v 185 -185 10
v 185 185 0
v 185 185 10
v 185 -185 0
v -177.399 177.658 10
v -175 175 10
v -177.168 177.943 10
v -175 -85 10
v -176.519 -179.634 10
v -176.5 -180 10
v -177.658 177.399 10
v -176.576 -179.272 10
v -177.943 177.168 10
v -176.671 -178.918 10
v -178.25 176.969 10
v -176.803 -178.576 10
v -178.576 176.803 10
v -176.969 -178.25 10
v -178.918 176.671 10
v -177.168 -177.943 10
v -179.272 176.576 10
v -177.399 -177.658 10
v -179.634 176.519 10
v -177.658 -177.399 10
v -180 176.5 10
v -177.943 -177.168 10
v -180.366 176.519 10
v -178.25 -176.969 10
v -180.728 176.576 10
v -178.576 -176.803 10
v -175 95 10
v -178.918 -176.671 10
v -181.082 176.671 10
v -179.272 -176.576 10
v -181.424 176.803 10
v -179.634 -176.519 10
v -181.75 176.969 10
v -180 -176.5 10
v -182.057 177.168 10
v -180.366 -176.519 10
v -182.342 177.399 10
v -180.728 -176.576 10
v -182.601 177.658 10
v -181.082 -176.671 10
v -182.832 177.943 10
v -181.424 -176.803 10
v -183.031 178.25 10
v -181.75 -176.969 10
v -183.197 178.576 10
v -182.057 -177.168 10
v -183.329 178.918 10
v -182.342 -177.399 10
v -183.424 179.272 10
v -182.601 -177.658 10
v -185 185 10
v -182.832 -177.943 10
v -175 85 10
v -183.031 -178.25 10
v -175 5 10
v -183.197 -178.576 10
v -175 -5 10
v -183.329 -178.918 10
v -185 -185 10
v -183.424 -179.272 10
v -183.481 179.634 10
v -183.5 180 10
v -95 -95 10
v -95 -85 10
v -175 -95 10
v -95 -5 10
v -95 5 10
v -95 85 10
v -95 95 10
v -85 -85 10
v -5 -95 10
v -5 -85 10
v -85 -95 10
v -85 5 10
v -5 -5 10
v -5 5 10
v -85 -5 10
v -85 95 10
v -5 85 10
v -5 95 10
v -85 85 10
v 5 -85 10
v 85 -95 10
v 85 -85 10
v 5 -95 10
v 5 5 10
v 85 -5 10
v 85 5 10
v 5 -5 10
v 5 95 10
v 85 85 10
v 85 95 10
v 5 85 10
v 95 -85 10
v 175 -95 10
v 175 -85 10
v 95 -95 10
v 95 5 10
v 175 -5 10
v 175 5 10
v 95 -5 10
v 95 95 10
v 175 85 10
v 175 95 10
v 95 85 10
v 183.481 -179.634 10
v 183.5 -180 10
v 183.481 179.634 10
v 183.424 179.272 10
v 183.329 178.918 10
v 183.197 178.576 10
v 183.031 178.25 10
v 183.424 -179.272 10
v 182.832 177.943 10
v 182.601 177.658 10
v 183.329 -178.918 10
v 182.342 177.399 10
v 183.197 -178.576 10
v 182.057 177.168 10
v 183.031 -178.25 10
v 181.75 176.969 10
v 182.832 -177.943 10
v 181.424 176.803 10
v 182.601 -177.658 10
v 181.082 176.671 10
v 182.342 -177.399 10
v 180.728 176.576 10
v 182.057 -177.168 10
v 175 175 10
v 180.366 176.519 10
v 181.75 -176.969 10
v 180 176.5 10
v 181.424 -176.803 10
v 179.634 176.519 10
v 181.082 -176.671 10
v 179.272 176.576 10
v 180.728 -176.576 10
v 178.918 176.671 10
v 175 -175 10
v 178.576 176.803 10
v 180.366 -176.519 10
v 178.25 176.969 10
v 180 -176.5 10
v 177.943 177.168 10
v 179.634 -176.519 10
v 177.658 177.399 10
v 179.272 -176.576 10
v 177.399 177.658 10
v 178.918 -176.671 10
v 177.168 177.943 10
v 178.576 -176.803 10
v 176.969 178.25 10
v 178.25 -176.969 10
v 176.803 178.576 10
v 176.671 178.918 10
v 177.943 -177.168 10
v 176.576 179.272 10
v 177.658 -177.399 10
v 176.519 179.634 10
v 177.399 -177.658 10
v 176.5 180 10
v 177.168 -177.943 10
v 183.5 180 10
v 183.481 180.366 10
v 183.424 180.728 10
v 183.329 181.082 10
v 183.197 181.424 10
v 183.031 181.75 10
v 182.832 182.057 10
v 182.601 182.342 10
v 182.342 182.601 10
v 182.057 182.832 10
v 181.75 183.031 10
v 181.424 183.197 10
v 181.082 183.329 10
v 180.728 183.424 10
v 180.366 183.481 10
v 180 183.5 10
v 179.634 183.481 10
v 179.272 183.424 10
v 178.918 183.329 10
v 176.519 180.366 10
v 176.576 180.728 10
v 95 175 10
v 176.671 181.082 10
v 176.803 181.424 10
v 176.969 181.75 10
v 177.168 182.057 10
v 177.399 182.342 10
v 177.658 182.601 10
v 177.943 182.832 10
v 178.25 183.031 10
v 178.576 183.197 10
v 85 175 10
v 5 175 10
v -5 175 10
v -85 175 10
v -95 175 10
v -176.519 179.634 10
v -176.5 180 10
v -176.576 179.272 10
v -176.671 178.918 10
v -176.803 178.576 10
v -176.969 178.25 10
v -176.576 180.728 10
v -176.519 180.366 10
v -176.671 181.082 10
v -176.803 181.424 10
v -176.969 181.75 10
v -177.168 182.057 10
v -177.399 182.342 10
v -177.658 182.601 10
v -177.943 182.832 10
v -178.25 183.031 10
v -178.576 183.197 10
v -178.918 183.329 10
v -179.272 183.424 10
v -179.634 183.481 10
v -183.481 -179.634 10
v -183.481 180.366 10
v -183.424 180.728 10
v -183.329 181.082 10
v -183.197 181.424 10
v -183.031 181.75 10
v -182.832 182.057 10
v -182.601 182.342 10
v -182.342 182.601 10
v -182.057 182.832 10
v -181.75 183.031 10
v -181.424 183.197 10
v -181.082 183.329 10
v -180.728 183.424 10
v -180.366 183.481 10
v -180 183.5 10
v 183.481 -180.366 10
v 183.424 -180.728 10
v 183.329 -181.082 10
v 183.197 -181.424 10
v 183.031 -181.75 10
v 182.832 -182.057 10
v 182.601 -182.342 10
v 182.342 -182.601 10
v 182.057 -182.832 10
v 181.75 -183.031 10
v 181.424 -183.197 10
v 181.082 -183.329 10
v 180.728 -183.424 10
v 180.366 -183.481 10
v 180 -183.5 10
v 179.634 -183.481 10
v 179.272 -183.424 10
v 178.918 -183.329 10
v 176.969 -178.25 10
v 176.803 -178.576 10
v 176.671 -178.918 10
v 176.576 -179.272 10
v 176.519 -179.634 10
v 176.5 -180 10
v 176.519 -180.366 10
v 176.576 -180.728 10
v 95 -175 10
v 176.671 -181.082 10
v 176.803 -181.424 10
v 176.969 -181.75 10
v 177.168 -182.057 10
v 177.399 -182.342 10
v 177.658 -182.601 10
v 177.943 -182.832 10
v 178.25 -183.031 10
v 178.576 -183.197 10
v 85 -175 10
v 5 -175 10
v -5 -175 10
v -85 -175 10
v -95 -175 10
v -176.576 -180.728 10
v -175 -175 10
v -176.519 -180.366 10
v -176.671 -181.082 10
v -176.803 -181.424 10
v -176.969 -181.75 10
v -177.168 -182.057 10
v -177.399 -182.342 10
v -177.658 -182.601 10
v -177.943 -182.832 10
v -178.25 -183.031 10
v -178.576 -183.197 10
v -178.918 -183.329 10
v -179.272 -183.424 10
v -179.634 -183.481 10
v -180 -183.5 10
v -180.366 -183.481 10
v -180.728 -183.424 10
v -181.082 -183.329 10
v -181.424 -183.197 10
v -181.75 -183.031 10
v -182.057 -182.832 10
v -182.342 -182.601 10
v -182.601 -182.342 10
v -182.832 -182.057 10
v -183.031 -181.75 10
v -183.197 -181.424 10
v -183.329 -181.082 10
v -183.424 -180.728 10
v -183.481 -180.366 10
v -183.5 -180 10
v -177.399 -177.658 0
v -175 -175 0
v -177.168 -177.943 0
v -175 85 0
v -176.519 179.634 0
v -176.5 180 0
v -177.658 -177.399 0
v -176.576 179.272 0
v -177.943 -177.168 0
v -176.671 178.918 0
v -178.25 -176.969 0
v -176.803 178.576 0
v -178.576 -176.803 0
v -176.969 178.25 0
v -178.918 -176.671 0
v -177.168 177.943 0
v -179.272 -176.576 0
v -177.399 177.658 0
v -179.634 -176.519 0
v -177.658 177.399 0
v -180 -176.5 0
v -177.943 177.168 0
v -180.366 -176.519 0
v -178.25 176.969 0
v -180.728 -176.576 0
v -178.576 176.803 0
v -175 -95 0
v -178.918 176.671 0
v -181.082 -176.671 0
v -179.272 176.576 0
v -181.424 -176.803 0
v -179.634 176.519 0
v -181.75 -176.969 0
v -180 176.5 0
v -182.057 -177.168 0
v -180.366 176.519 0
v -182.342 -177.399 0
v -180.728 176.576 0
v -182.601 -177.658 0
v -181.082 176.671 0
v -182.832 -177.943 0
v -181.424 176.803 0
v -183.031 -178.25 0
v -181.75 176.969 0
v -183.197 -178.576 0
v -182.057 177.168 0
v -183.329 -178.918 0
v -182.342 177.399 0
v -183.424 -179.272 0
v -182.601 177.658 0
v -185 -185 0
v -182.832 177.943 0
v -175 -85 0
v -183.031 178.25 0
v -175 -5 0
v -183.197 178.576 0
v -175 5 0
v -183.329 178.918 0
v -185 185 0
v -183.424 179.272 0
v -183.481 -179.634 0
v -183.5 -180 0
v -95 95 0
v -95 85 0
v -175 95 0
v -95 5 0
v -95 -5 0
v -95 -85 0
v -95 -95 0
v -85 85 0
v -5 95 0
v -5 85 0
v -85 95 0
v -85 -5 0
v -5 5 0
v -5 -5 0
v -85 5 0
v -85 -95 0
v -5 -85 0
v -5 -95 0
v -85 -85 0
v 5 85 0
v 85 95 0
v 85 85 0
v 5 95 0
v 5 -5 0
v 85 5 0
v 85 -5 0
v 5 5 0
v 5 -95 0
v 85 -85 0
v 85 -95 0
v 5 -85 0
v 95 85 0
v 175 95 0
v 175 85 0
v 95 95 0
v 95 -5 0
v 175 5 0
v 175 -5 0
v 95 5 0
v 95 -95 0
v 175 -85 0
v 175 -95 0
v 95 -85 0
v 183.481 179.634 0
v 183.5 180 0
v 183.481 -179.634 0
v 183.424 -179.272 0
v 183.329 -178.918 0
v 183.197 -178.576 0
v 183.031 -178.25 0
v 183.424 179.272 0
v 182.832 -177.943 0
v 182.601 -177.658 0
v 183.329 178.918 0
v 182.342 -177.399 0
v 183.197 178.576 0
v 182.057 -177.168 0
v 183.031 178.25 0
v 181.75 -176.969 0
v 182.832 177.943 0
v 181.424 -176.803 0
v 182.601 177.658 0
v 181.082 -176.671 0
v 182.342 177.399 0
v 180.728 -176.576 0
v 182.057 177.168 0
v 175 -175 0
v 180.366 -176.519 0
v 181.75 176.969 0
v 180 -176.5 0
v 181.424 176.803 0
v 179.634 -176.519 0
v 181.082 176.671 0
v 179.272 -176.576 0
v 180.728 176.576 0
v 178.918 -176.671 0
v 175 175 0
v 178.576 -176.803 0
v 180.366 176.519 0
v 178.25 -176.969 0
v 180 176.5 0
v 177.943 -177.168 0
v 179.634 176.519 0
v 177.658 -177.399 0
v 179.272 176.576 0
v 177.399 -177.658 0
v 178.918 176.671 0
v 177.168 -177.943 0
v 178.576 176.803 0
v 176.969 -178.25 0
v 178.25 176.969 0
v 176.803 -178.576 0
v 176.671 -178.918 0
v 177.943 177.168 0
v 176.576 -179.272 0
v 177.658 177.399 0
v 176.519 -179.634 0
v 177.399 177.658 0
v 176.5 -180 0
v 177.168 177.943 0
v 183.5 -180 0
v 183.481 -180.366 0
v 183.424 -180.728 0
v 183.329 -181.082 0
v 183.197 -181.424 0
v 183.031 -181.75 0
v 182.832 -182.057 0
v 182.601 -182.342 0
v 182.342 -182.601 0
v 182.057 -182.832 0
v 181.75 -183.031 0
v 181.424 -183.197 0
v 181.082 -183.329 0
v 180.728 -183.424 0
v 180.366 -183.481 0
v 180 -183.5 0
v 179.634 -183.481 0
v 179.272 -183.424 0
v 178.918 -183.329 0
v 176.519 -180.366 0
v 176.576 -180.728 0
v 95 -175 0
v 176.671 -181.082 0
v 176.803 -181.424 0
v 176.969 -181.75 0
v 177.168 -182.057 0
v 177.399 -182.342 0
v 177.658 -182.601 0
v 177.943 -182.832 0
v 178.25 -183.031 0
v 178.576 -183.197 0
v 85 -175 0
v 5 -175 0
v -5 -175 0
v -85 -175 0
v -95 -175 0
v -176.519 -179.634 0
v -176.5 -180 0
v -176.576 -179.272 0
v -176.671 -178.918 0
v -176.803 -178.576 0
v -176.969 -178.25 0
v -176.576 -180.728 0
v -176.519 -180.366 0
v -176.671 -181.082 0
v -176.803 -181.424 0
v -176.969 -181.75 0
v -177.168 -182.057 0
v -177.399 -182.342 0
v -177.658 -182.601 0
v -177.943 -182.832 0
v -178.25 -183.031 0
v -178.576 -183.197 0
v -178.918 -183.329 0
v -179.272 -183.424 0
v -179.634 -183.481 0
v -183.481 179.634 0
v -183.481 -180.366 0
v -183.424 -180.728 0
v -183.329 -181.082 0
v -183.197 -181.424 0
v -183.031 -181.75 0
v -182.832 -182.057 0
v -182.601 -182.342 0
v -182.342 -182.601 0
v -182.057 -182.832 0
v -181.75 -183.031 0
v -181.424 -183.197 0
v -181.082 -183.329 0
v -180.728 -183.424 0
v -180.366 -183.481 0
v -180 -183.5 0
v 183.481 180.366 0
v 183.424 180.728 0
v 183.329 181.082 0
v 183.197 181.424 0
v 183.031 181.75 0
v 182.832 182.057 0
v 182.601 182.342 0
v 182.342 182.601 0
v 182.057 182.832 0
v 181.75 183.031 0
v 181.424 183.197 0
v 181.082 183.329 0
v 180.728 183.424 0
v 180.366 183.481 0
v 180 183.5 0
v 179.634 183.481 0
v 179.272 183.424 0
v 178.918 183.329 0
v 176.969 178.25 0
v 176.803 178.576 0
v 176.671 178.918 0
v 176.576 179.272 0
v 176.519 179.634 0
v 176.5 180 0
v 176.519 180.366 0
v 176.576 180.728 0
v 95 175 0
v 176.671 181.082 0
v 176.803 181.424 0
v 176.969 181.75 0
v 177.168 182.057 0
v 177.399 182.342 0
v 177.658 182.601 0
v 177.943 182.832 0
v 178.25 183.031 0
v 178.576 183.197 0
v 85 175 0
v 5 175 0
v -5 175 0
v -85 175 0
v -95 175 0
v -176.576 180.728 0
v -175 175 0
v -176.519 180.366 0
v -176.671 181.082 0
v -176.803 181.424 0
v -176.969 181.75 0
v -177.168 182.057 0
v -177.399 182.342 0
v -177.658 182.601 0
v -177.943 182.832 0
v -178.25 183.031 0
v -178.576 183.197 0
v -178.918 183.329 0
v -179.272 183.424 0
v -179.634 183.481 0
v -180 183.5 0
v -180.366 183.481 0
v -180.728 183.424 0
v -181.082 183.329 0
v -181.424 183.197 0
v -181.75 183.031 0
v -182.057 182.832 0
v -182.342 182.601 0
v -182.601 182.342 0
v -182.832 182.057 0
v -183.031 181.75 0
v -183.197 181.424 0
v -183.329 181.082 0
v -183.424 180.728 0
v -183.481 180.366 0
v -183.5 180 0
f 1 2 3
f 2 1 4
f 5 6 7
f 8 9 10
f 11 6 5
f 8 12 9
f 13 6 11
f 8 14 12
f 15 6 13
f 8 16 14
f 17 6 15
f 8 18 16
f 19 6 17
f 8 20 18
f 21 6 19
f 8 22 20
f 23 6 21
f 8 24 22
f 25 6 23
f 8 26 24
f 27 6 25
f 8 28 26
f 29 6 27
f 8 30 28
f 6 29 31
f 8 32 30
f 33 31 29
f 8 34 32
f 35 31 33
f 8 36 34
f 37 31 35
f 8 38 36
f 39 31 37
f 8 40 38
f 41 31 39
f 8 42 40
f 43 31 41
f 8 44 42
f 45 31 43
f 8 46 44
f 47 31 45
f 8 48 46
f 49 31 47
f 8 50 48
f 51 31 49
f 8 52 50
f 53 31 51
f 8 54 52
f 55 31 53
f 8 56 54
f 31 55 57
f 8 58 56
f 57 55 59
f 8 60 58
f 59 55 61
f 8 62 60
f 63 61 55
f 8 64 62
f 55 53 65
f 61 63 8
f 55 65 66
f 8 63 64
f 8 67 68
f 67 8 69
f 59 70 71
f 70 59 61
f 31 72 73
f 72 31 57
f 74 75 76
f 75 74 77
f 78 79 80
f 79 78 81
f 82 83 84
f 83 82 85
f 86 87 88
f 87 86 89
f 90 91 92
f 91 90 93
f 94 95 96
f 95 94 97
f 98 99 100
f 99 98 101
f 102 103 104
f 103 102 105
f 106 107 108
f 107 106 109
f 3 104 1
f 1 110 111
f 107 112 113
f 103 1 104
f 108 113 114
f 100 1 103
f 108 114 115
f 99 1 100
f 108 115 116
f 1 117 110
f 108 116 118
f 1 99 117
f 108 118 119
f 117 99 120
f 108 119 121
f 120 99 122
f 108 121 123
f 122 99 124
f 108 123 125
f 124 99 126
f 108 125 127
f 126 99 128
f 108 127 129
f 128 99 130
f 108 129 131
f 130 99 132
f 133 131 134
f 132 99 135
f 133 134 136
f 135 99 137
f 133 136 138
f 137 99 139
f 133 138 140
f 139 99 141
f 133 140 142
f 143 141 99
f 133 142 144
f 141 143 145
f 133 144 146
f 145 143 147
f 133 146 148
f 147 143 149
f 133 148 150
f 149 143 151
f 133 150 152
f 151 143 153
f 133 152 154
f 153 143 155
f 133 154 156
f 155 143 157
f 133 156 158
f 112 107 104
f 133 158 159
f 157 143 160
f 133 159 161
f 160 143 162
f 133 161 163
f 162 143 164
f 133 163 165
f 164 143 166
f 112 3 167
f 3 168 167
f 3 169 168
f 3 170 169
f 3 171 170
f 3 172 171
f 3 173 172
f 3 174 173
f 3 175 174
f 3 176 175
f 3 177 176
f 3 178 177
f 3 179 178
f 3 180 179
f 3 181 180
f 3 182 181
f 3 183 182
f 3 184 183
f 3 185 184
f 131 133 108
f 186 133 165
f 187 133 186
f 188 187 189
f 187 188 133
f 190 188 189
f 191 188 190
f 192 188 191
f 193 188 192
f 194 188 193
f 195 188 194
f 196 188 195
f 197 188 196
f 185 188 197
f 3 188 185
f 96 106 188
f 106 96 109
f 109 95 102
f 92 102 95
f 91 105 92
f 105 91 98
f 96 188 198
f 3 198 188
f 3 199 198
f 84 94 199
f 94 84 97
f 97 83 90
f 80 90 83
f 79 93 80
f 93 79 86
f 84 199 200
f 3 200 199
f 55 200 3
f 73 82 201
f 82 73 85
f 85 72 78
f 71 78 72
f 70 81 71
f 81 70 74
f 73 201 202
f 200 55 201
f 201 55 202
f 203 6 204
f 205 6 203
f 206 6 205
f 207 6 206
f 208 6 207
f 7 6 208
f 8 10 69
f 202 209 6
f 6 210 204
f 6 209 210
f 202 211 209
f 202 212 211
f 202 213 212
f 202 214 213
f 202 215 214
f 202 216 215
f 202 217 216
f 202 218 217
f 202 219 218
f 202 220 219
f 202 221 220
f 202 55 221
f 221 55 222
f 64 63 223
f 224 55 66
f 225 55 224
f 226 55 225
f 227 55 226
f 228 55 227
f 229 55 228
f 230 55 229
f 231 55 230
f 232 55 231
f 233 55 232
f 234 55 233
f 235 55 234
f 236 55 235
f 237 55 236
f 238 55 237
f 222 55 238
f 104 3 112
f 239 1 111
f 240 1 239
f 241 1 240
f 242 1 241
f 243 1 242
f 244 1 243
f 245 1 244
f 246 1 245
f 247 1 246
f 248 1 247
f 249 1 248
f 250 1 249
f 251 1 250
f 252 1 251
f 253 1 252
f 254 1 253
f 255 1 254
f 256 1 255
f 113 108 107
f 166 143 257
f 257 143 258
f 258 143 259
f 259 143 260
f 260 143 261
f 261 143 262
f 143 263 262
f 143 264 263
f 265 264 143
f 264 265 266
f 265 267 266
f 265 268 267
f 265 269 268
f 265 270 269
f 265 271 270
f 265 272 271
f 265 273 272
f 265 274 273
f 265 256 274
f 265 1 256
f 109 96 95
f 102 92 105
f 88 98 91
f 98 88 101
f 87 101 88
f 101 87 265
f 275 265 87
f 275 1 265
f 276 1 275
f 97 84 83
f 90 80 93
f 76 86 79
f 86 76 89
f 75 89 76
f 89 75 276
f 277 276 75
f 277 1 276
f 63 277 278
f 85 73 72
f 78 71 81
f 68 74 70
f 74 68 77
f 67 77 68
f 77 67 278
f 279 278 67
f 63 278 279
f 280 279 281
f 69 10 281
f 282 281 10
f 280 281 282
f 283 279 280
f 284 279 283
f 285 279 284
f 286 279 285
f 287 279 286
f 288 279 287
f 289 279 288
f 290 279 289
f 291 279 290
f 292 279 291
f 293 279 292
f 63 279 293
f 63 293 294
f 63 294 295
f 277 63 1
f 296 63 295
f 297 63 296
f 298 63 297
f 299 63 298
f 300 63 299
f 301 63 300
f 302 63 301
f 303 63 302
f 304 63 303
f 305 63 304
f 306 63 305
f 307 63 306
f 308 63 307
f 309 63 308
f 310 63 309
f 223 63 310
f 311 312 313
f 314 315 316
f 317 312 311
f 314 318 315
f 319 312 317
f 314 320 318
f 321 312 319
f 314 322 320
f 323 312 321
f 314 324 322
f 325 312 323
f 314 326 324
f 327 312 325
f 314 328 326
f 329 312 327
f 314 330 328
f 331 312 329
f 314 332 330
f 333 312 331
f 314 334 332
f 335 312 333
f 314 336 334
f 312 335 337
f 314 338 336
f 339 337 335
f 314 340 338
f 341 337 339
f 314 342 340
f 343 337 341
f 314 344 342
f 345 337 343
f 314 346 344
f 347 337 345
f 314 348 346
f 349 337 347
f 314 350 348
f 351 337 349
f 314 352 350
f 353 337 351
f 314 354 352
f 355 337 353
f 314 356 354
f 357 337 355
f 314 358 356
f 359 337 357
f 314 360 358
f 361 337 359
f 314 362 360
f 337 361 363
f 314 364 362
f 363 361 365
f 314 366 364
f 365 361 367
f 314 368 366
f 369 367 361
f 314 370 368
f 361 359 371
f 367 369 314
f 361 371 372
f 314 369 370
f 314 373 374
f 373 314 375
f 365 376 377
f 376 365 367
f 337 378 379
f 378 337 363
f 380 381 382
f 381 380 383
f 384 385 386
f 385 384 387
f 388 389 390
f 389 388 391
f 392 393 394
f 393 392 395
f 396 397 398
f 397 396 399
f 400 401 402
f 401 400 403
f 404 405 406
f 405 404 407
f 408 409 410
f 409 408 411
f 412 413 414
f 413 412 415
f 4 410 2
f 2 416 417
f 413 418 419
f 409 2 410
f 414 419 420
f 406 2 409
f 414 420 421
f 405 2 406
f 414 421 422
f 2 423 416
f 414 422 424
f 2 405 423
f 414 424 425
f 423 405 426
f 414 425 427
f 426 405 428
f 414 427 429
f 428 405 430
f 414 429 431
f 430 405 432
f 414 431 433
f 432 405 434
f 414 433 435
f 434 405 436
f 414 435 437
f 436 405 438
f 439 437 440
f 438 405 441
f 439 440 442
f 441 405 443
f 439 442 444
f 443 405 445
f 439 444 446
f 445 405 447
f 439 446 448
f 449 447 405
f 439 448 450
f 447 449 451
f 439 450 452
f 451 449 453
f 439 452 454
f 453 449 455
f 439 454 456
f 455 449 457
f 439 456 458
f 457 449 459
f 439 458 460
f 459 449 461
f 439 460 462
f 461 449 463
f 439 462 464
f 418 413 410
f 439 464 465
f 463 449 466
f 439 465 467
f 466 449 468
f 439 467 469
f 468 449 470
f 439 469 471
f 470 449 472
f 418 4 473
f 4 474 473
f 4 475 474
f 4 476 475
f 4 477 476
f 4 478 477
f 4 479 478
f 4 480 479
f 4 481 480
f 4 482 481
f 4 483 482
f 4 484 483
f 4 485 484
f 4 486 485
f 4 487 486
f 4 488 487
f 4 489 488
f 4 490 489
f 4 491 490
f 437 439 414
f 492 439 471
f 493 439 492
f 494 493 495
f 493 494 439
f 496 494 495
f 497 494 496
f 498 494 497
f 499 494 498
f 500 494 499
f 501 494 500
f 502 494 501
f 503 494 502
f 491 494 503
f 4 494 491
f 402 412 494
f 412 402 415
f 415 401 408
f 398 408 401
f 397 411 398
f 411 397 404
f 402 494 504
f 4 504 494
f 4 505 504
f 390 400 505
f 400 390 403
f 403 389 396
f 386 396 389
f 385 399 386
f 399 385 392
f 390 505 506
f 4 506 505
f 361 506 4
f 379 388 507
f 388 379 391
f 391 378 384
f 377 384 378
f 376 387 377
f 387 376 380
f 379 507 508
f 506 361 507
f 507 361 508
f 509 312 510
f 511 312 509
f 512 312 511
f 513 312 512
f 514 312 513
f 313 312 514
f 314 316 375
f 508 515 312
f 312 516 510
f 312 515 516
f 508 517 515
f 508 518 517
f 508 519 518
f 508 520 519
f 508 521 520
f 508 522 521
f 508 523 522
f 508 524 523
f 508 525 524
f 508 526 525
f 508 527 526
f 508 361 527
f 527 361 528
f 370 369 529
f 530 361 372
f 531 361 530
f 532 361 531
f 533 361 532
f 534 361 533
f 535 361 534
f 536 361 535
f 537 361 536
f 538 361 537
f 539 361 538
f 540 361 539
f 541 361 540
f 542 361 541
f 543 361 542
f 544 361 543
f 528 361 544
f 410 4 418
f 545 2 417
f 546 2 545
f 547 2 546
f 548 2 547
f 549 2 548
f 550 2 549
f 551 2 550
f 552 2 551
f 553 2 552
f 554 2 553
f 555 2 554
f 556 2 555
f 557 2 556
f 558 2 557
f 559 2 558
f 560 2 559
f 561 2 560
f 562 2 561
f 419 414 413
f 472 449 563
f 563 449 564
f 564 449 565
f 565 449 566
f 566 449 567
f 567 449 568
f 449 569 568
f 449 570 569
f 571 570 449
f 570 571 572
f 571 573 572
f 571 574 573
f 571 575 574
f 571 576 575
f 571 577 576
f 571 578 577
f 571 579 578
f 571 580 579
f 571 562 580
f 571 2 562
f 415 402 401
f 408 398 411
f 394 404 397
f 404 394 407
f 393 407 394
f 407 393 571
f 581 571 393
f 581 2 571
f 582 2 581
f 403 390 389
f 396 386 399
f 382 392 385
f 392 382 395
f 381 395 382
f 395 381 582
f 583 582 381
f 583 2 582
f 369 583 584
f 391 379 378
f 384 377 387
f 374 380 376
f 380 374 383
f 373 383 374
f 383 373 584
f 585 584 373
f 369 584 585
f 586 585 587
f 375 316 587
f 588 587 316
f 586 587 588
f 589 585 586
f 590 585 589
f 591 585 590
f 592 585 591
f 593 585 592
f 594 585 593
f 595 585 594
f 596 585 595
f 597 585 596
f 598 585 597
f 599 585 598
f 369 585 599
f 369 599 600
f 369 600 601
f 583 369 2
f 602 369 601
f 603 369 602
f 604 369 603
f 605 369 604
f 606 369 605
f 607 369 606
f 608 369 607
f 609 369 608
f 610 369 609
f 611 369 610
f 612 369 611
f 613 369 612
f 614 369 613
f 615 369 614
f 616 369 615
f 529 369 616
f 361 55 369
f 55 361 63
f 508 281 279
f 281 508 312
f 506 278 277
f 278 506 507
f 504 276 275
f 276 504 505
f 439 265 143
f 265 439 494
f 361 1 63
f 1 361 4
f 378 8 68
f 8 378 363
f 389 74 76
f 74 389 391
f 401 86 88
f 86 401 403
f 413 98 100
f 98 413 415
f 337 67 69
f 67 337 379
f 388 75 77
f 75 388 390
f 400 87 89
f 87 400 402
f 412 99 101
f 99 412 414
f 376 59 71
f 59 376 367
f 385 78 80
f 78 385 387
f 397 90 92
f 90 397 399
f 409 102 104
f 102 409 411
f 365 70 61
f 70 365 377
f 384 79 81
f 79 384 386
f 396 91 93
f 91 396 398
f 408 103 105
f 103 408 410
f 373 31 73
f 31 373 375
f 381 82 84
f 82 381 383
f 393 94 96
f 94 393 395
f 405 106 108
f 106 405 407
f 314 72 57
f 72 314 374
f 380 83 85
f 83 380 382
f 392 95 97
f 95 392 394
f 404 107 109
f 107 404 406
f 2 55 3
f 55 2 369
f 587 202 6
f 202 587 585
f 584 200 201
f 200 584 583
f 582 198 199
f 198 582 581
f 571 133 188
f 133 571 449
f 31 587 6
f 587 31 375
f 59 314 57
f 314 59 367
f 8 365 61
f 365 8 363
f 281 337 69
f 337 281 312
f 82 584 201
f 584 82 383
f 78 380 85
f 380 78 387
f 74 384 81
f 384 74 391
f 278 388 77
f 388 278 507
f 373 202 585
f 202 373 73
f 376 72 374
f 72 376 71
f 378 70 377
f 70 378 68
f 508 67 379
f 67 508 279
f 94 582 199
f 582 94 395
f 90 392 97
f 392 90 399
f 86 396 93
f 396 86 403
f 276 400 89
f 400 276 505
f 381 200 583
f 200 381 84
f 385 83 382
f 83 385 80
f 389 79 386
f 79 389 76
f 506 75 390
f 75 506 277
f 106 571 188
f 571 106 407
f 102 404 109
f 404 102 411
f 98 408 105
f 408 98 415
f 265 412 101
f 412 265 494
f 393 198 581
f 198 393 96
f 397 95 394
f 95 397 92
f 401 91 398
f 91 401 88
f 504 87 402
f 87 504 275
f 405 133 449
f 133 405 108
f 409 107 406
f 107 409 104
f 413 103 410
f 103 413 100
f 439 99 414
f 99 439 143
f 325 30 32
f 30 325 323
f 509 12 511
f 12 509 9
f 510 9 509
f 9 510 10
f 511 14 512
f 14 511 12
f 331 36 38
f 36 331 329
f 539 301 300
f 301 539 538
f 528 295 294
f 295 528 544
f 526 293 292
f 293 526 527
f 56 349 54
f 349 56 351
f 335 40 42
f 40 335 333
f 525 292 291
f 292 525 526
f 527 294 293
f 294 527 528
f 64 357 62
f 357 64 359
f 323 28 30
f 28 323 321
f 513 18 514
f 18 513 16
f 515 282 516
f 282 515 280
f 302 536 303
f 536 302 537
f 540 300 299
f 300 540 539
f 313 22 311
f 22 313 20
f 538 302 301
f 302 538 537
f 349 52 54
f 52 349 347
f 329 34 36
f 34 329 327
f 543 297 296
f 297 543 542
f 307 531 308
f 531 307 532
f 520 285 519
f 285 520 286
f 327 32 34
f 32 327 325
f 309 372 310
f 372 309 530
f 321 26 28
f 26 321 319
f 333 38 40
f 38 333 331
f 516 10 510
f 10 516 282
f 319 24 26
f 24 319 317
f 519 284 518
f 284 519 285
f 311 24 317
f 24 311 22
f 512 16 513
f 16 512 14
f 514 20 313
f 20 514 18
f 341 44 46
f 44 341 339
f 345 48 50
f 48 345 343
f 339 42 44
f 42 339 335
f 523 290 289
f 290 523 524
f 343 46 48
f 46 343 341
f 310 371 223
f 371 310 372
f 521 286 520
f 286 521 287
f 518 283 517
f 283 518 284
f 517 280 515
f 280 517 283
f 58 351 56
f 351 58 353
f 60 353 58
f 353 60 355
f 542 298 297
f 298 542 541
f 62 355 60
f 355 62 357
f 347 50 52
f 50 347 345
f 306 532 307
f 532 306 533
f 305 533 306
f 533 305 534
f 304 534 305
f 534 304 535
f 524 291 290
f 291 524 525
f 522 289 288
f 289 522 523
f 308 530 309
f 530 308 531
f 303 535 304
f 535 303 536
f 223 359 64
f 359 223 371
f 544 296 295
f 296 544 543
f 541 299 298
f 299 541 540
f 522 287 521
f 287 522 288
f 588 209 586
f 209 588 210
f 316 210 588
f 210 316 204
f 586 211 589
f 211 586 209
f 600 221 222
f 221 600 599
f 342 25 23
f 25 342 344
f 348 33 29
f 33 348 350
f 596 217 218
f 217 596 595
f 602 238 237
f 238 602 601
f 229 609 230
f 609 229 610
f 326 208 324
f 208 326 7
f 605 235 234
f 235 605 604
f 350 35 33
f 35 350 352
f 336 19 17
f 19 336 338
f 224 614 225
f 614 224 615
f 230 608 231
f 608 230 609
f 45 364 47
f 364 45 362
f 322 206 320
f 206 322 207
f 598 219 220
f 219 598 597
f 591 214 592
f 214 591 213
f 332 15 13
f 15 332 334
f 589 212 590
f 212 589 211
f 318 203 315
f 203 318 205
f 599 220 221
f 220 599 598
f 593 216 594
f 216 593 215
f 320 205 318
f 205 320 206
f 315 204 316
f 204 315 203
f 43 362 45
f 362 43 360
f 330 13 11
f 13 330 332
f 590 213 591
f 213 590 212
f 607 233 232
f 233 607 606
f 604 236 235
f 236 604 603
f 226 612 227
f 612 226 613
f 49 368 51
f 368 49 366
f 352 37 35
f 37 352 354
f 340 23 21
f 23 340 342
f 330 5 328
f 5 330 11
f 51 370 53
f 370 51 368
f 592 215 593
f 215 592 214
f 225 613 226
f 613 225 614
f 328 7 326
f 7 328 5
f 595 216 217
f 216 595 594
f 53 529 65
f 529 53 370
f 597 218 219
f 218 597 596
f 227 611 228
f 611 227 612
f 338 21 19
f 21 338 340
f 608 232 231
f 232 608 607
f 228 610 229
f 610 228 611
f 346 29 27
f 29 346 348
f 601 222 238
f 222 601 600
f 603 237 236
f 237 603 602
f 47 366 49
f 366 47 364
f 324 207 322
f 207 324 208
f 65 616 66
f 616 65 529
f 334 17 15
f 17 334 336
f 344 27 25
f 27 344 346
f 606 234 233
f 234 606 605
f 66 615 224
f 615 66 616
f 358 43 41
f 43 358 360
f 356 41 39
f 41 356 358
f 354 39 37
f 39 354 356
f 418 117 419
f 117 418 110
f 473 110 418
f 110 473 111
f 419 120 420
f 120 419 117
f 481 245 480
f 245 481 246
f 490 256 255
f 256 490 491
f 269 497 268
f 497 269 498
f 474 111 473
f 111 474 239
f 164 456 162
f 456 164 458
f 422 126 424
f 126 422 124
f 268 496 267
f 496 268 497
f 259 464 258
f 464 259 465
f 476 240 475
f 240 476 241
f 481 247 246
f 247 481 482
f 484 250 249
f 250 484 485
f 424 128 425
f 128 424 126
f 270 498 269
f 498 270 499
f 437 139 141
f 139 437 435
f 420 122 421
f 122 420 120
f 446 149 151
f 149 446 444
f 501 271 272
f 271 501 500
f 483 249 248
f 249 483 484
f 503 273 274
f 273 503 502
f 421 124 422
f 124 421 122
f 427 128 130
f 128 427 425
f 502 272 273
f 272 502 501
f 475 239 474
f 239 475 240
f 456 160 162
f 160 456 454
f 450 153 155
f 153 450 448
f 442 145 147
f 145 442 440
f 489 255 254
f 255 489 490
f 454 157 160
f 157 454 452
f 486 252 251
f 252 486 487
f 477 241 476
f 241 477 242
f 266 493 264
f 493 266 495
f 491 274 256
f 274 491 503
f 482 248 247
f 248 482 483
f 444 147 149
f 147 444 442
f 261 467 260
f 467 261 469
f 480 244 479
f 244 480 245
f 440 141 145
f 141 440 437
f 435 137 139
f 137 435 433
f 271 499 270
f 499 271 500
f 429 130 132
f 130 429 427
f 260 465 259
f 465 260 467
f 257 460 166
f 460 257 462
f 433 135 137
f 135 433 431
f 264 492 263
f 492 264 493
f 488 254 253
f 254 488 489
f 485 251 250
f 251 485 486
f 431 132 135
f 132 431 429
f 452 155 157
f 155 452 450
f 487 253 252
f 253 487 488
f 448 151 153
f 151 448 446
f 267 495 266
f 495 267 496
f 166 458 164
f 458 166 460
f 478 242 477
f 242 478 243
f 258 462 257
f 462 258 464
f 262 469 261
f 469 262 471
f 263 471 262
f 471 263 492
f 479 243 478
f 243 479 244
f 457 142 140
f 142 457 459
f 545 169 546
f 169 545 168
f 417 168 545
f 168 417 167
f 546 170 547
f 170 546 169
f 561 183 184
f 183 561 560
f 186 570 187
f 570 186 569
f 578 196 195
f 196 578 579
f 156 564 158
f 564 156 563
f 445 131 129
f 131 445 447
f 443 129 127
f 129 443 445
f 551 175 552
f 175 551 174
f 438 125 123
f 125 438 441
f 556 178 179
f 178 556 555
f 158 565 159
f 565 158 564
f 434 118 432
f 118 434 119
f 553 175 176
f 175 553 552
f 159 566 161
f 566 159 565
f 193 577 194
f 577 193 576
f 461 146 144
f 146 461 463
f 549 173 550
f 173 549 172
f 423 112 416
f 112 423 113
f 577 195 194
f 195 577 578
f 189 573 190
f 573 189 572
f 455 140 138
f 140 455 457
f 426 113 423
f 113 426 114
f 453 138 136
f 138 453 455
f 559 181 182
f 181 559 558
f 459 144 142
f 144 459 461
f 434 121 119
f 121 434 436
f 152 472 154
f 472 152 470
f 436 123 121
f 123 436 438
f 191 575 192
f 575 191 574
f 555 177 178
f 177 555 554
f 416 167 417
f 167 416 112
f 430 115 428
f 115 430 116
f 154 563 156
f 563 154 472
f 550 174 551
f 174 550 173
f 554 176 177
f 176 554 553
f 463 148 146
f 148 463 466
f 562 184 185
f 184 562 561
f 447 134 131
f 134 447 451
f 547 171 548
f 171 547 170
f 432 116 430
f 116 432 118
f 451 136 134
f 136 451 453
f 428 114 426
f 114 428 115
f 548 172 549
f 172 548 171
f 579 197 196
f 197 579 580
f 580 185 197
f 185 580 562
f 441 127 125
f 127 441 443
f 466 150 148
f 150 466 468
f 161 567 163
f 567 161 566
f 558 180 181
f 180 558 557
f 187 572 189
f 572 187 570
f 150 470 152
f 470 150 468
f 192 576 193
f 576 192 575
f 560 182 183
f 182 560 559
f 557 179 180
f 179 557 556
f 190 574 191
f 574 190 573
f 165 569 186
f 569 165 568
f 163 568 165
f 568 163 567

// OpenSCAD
$fn=60;
module grid_frame() {
    difference() {
        union() {
            for (y = [-180 : 90 : 180]) translate([-185, y - 5, 0]) cube([370, 10, 10]);
            for (x = [-180 : 90 : 180]) translate([x - 5, -185, 0]) cube([10, 370, 10]);
        }
        for (hx = [-180, 180]) for (hy = [-180, 180]) translate([hx, hy, -1]) cylinder(d=7, h=12);
    }
}
grid_frame();
